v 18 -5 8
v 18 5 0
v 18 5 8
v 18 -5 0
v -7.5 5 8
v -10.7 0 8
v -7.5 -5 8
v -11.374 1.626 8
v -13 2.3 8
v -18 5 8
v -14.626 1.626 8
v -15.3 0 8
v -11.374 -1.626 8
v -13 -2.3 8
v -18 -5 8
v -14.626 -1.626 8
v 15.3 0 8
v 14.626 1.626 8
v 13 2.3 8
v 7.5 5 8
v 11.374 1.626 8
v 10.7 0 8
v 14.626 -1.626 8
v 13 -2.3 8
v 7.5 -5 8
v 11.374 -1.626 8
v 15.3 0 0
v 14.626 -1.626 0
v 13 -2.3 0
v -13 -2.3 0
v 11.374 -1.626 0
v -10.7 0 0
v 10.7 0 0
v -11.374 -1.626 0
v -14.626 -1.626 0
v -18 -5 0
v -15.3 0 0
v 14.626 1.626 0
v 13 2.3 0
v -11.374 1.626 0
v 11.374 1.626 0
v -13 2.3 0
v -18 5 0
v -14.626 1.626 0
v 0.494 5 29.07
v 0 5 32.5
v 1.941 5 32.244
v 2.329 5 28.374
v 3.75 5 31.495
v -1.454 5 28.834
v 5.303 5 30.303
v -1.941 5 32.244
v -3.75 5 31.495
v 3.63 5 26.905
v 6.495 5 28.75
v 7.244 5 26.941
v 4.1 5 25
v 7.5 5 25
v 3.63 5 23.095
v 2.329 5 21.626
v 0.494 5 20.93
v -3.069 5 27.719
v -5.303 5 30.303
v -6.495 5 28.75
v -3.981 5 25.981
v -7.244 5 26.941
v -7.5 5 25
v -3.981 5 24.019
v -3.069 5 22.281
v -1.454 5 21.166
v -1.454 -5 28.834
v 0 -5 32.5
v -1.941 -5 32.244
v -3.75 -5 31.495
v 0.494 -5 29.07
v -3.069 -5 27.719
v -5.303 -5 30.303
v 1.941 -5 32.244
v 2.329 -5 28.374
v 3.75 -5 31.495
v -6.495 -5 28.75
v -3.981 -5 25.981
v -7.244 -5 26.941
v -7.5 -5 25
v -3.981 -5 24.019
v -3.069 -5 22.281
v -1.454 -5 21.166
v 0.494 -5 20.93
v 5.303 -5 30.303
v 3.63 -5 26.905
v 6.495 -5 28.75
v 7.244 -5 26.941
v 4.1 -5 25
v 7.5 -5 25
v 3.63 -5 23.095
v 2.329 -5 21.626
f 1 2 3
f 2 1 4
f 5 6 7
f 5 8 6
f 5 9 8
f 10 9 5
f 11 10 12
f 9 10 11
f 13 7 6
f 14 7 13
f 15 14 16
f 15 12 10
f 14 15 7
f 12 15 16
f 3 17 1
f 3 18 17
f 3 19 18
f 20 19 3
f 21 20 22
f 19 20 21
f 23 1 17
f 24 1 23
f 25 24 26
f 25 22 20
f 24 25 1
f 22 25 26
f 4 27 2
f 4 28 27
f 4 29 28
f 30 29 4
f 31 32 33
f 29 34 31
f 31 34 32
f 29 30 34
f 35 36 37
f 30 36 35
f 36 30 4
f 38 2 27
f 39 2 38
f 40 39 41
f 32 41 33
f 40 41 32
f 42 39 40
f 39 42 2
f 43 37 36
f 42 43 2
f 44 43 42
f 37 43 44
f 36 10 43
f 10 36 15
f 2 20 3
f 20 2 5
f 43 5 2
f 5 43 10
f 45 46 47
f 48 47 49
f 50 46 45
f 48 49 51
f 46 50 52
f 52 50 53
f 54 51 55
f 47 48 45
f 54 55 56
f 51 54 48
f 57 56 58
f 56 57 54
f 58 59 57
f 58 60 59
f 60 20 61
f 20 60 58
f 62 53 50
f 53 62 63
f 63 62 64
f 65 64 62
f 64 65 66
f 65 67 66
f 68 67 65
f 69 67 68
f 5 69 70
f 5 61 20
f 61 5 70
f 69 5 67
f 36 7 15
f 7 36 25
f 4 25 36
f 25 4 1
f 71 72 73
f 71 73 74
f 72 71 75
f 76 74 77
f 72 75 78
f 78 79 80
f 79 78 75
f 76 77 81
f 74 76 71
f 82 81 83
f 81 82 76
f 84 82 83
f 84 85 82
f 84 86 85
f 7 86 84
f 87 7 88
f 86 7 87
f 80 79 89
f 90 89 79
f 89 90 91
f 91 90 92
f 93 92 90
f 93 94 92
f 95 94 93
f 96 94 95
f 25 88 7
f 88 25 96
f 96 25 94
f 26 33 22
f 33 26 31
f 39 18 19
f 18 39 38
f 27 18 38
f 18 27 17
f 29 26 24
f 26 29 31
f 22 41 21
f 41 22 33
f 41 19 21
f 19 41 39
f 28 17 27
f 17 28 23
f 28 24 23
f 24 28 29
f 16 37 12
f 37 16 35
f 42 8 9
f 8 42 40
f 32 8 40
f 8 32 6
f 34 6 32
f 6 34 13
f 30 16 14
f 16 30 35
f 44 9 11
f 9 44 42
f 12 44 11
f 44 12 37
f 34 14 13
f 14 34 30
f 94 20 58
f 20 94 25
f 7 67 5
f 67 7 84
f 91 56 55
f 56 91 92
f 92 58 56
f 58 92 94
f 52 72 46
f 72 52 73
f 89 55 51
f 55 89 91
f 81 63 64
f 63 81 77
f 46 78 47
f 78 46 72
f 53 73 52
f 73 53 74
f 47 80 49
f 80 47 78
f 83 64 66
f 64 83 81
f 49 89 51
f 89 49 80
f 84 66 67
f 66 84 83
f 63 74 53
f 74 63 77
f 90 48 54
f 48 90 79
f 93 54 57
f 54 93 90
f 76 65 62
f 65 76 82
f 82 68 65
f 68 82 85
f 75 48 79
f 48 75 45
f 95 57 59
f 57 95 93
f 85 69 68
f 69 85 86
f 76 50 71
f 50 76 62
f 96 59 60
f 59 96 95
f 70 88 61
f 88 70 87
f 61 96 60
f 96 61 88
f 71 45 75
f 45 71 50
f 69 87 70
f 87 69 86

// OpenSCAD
// All measurements in mm.

// Radius of rod
r_rod = 4.1;

// Radius of screw hole
r_screw = 2.3;

// Outer radius of top of block
r_block = 7.5;

// Width of block
w_block = 10;

// Height of rod center
h_rod = 25;

// Height of legs
h_legs = 8;

// Distance between holes
d_holes = 26;

// Total length of foot of block
l_foot = 36;

module rod_block() {
	difference() {
		union() {
			translate([0,0,h_rod/2]) cube(size=[r_block*2,w_block,h_rod],center=true);
			translate([0,0,h_rod]) rotate([90,0,0]) cylinder(h=w_block,r=r_block,center=true);
		}
		translate([0,0,h_rod]) rotate([90,0,0]) cylinder(h=2*w_block,r=r_rod,center=true);
	}
}

module foot() {
	difference() {
		translate([0,0,h_legs/2]) cube(size=[l_foot,w_block,h_legs],center=true);
		translate([d_holes/2,0,h_legs/2]) cylinder(h=h_legs*2,r=r_screw,center=true);
		translate([-d_holes/2,0,h_legs/2]) cylinder(h=h_legs*2,r=r_screw,center=true);
	}
}

union() {
	foot();
	rod_block();
}
